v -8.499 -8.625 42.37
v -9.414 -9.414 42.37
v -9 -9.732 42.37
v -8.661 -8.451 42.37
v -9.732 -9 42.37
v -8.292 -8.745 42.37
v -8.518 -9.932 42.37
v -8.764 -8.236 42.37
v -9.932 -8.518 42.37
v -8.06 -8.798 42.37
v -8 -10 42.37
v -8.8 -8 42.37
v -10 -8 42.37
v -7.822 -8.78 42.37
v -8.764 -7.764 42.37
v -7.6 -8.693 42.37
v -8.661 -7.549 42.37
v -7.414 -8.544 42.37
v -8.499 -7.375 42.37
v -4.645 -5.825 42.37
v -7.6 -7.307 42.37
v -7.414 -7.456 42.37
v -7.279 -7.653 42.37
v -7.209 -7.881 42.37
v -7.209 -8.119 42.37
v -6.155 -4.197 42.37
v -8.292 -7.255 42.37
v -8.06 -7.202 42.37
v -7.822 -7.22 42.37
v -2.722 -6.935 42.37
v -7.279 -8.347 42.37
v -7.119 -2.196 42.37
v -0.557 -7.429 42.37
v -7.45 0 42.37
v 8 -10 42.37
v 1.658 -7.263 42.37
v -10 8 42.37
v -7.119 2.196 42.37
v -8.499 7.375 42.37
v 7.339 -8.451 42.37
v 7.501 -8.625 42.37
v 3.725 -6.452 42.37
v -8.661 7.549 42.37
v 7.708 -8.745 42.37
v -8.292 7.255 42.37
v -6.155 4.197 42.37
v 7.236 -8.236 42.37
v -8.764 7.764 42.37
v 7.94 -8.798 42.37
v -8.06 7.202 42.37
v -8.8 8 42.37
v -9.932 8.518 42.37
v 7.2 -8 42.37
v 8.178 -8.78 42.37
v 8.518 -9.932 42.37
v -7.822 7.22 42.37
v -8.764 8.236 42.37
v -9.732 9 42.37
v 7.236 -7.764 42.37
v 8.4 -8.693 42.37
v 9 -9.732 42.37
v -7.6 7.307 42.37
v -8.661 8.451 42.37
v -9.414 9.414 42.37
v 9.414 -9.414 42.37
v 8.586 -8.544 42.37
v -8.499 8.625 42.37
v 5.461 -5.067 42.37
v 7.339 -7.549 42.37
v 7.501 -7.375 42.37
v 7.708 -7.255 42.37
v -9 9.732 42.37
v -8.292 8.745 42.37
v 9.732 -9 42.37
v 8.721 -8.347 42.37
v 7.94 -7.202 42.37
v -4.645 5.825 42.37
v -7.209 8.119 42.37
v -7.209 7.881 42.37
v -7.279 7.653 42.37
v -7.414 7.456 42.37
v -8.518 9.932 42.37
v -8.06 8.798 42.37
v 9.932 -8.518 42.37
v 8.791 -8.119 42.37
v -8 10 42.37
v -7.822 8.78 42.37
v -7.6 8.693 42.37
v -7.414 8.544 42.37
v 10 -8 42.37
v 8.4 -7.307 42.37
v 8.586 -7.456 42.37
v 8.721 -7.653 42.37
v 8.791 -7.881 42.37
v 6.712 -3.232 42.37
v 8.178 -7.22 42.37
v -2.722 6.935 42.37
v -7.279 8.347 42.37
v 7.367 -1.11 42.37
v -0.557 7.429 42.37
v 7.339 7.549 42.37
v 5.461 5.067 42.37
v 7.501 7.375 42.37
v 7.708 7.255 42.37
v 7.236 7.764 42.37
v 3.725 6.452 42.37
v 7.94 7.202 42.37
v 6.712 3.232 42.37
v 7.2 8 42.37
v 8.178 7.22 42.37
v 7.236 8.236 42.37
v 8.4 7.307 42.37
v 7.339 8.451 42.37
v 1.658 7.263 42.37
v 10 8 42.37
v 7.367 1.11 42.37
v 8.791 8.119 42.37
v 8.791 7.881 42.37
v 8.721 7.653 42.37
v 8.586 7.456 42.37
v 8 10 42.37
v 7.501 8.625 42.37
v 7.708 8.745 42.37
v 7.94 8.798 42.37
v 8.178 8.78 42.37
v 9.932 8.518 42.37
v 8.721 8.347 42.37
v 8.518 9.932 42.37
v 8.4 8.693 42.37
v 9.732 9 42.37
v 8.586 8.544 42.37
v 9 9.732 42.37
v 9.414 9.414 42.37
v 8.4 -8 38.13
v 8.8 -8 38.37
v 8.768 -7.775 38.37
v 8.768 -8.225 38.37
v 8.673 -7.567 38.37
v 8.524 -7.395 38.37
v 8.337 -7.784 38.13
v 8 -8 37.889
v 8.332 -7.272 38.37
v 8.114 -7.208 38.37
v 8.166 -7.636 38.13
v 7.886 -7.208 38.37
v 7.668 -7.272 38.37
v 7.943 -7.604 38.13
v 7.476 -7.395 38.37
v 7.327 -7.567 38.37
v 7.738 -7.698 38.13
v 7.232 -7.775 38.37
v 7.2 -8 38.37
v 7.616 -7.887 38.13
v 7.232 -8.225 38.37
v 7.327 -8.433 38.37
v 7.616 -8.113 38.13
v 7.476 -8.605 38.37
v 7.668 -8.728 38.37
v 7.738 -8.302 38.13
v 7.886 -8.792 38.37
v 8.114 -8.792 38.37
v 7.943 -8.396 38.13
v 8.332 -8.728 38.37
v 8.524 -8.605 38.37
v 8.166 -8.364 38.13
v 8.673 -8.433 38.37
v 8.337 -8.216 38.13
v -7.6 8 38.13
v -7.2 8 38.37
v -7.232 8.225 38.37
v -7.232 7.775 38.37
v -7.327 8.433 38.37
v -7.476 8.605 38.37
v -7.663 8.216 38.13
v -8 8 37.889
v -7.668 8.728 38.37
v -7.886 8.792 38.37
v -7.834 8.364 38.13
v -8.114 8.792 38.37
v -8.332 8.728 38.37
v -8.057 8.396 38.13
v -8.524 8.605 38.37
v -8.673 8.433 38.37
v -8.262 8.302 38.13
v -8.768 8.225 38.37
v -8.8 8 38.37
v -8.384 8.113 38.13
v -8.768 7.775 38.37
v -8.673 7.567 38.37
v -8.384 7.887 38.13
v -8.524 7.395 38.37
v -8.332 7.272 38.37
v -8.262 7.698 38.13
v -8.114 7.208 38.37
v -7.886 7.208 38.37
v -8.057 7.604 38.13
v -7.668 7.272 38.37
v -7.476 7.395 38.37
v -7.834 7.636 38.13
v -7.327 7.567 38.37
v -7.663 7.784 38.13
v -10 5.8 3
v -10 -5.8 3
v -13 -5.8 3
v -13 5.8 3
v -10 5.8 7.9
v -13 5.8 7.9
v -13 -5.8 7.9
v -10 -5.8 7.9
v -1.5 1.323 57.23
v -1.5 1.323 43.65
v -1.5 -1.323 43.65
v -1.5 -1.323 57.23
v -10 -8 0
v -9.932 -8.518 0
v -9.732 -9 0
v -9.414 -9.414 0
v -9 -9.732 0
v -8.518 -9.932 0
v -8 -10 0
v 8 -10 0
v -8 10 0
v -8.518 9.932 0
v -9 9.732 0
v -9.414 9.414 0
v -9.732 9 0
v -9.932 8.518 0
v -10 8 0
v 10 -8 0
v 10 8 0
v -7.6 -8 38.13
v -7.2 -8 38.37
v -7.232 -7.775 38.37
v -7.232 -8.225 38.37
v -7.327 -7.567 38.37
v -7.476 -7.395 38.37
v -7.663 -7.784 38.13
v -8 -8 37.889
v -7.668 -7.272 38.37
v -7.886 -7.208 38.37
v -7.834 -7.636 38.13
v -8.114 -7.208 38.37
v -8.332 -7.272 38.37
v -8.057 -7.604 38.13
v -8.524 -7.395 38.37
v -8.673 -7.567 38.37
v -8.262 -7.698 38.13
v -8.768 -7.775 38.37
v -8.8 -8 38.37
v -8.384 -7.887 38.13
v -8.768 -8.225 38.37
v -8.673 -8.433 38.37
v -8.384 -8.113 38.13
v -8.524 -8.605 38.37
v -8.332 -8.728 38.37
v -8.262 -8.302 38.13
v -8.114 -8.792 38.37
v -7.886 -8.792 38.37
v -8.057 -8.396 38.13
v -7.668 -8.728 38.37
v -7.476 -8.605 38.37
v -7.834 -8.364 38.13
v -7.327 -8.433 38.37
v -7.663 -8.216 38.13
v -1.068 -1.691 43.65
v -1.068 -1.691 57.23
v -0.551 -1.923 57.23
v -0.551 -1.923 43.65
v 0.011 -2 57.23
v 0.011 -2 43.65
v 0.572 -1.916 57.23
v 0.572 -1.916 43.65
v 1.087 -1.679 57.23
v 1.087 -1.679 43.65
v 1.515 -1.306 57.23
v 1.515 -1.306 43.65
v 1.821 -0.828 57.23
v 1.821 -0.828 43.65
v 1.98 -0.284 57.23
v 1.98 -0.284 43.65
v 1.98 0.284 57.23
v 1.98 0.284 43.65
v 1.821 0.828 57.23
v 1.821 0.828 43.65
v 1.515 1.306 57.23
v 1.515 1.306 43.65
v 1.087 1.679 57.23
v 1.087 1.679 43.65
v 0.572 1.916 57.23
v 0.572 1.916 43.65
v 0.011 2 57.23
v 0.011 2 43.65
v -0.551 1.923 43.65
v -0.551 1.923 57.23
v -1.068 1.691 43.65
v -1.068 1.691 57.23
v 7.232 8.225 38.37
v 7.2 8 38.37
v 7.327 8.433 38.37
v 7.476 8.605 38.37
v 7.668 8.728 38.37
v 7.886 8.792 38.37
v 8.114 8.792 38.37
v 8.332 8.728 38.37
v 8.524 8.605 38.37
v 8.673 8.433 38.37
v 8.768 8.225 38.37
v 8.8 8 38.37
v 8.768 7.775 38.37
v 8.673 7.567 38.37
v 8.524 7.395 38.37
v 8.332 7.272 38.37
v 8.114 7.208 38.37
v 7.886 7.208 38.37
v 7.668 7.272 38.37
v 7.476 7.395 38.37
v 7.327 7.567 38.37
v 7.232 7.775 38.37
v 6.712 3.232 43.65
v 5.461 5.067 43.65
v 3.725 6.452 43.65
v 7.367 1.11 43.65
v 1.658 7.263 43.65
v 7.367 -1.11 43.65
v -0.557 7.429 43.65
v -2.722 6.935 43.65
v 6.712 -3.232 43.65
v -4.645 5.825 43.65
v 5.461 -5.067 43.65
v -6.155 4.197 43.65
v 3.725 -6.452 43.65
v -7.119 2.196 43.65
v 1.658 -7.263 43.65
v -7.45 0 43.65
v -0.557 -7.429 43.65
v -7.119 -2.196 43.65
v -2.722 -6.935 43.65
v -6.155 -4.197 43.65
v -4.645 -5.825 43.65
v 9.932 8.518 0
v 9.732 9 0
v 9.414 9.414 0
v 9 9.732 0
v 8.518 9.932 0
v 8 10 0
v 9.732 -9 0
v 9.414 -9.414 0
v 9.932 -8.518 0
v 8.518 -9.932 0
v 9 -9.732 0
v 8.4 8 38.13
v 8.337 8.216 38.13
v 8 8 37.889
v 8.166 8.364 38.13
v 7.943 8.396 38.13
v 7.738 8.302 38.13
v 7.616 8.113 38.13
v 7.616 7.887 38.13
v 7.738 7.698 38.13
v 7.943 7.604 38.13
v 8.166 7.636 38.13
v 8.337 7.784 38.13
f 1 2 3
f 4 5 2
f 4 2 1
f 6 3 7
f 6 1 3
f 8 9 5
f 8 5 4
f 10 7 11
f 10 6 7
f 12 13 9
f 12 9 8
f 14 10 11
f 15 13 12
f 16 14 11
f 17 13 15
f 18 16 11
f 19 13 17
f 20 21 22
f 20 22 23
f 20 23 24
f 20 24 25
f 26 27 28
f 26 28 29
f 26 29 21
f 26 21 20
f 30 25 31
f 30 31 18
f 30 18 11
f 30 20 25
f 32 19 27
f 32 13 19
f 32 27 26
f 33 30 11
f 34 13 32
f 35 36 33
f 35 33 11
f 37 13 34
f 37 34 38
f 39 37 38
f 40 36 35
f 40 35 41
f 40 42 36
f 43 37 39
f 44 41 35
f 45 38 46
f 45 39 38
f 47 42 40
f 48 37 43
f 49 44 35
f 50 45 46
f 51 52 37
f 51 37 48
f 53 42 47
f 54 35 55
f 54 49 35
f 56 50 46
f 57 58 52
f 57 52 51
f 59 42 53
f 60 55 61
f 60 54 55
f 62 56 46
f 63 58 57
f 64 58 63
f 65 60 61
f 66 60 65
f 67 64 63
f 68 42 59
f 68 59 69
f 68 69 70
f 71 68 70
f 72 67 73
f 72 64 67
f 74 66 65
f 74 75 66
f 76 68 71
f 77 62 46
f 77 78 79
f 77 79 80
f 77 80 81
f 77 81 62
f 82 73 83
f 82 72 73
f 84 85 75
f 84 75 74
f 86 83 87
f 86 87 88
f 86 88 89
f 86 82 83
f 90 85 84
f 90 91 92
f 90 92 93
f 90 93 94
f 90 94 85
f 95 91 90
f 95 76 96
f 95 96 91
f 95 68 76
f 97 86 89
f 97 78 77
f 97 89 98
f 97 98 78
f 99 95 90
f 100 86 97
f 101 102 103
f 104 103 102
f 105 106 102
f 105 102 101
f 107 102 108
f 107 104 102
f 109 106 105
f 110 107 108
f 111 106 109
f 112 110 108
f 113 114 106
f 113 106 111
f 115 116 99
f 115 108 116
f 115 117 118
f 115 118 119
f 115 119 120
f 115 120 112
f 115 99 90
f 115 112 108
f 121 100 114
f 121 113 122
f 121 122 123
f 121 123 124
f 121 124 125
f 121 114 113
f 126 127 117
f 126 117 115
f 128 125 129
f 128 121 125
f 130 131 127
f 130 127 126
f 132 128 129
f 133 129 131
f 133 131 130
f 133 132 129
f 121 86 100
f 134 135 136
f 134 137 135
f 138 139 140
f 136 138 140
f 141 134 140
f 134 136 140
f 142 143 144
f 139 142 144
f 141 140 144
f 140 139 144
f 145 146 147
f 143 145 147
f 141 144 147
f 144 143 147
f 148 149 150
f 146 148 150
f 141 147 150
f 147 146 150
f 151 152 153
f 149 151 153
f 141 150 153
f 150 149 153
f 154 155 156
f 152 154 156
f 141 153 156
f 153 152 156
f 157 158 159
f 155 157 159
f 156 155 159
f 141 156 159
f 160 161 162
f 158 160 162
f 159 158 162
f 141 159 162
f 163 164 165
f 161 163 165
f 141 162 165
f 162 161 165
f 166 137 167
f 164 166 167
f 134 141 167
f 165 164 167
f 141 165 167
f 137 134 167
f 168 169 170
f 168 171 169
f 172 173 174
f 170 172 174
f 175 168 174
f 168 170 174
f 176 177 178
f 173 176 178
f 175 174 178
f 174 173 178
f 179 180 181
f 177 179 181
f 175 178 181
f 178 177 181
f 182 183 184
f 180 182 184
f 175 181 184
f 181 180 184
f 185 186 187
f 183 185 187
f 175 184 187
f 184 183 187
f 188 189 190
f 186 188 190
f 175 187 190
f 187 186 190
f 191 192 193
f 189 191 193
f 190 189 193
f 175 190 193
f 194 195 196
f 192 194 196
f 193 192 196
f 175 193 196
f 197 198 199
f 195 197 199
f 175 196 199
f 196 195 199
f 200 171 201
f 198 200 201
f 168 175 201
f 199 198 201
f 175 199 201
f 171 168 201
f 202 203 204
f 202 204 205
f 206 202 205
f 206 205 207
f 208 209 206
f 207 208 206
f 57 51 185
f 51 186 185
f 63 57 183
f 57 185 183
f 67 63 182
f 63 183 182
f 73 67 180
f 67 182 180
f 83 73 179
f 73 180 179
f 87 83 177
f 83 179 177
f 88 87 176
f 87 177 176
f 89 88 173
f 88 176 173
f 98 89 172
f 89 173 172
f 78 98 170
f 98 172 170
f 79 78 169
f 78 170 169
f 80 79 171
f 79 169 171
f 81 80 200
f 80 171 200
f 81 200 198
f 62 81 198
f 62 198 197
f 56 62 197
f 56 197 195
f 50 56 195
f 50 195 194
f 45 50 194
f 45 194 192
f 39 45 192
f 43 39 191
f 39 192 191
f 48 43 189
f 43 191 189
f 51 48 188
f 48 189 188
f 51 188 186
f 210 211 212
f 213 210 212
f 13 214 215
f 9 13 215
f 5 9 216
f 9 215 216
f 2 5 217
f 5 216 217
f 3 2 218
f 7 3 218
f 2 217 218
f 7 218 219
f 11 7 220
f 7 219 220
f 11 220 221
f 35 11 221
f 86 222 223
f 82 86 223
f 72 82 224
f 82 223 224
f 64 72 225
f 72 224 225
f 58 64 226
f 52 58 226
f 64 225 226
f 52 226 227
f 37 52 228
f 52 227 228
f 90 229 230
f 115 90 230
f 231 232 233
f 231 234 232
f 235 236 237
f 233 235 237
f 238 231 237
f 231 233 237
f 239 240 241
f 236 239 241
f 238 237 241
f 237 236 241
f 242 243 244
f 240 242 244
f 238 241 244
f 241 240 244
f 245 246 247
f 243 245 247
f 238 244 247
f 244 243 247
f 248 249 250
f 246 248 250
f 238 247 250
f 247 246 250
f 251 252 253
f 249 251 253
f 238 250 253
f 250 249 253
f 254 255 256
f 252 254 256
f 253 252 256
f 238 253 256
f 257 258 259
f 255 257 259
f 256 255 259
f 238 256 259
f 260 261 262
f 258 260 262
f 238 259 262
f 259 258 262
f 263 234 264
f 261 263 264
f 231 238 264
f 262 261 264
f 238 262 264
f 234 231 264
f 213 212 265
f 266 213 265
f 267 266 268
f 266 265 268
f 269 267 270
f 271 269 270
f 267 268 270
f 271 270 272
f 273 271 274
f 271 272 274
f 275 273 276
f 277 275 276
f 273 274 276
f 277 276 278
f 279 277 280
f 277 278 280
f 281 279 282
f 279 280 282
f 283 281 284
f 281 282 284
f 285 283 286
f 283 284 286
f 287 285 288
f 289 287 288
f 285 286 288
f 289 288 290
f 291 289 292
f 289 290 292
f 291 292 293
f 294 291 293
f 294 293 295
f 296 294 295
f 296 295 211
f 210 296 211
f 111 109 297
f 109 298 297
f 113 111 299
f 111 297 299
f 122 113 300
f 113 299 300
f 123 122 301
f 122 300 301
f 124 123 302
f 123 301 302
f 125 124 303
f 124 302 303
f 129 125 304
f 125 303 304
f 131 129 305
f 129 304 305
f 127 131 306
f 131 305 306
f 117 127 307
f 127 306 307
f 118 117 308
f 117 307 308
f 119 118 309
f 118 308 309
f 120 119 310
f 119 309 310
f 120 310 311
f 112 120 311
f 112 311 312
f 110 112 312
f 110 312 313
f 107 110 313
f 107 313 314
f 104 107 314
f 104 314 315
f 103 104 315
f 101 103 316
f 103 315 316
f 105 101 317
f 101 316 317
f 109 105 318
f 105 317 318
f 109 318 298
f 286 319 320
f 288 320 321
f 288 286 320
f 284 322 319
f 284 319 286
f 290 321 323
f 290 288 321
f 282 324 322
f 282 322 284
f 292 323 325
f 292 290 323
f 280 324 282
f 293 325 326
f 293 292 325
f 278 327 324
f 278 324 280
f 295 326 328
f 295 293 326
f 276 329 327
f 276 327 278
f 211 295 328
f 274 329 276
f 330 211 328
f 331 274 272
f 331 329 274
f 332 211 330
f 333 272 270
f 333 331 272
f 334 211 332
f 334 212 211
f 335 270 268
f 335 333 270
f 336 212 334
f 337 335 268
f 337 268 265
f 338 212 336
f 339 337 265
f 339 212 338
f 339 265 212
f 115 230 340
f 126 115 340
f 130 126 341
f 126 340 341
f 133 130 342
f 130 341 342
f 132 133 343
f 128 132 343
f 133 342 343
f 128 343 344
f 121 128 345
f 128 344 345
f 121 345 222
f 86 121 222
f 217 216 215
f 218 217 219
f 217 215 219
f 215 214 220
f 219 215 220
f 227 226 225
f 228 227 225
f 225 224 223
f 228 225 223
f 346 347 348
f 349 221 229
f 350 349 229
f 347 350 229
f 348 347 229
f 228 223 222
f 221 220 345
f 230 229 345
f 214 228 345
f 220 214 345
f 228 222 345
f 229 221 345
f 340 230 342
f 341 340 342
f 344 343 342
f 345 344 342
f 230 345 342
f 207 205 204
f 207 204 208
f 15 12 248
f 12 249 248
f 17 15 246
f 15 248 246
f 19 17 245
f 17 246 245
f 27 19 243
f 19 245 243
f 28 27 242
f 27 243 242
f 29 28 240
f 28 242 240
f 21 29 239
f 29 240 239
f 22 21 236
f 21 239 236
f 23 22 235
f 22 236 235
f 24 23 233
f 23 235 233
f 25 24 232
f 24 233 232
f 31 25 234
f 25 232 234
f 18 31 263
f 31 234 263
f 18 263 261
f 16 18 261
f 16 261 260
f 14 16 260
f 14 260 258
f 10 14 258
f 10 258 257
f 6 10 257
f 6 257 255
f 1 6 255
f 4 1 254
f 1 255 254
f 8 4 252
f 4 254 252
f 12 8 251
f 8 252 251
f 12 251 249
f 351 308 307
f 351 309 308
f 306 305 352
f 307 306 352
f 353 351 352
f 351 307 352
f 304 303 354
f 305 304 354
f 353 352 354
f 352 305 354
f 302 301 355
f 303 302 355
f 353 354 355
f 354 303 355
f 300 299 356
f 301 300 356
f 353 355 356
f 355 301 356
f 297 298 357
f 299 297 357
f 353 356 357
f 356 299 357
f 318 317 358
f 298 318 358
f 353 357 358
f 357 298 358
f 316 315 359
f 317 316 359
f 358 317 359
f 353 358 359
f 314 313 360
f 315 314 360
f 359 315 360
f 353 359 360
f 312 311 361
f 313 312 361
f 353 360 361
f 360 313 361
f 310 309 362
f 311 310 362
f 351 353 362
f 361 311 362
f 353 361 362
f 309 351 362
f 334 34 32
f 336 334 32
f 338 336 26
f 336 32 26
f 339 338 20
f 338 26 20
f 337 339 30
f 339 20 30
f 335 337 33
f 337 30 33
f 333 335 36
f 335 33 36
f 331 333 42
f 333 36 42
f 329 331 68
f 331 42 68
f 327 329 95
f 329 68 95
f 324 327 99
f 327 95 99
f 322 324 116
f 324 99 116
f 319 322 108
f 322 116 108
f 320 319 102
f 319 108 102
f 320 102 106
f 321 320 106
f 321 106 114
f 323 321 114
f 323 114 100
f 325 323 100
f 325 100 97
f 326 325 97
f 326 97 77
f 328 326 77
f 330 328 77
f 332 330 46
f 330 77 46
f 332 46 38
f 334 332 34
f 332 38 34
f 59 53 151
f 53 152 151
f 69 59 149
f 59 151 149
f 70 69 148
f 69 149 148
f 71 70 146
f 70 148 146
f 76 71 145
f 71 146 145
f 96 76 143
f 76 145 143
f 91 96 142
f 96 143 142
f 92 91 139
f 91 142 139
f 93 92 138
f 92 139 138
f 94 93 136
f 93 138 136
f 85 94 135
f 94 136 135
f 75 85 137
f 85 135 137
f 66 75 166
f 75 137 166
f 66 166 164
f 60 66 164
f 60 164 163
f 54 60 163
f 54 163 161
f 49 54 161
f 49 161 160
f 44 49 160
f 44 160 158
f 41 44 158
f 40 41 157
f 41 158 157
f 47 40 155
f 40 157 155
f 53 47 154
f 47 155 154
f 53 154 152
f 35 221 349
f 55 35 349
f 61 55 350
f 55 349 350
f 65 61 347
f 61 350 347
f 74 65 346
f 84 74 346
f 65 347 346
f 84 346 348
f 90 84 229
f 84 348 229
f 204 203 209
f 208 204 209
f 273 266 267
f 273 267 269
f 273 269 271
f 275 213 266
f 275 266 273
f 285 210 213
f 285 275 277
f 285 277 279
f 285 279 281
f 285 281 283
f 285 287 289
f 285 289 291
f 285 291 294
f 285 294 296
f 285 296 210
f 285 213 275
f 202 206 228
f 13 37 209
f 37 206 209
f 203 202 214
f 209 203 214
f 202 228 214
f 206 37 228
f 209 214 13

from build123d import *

# Parameters (mm, degrees)
BOSS_EXTRUDE1_DEPTH   = 42.37
SKETCH2_R             = 7.45
BOSS_EXTRUDE2_DEPTH   = 1.28
BOSS_EXTRUDE3_DEPTH   = 13.58
SKETCH4_W             = 4.9
SKETCH4_H             = 11.6
BOSS_EXTRUDE4_DEPTH   = 3
M2_TAPPED_HOLE1_D     = 1.6
M2_TAPPED_HOLE1_DEPTH = 4
M2_TAPPED_HOLE1_TIP   = 0.480688495


with BuildPart() as part:
    # Sketch1 → Boss-Extrude1 (new body)
    with BuildSketch(Plane.XY):
        with BuildLine():
            Line((-8, -10), (8, -10))
            ThreePointArc((8, -10), (9.414213562, -9.414213562), (10, -8))
            Line((10, -8), (10, 8))
            ThreePointArc((10, 8), (9.414213562, 9.414213562), (8, 10))
            Line((8, 10), (-8, 10))
            ThreePointArc((-8, 10), (-9.414213562, 9.414213562), (-10, 8))
            Line((-10, 8), (-10, -8))
            ThreePointArc((-10, -8), (-9.414213562, -9.414213562), (-8, -10))
        make_face()
    extrude(amount=BOSS_EXTRUDE1_DEPTH)

    # Sketch2 → Boss-Extrude2 (add)
    with BuildSketch(Plane.XY.offset(42.37)):
        with Locations(Location((0, 0, 0), (0, 0, 180))):
            Circle(SKETCH2_R)
    extrude(amount=BOSS_EXTRUDE2_DEPTH)

    # Sketch3 → Boss-Extrude3 (add)
    with BuildSketch(Plane.XY.offset(43.65)):
        with BuildLine():
            Line((-1.5, 1.322875656), (-1.5, -1.322875656))
            ThreePointArc((-1.5, -1.322875656), (2, 0), (-1.5, 1.322875656))
        make_face()
    extrude(amount=BOSS_EXTRUDE3_DEPTH)

    # Sketch4 → Boss-Extrude4 (add)
    with BuildSketch(Plane.ZY.offset(10)):
        with Locations((5.45, 0)):
            Rectangle(SKETCH4_W, SKETCH4_H)
    extrude(amount=BOSS_EXTRUDE4_DEPTH)

    # M2 Tapped Hole1
    with Locations(Plane.XY.offset(42.37)):
        with Locations((-8, -8), (8, -8), (8, 8), (-8, 8)):
            Hole(M2_TAPPED_HOLE1_D / 2, depth=M2_TAPPED_HOLE1_DEPTH)
            with Locations((0, 0, -(M2_TAPPED_HOLE1_DEPTH + M2_TAPPED_HOLE1_TIP / 2))):  # 118° drill point
                Cone(0, M2_TAPPED_HOLE1_D / 2, M2_TAPPED_HOLE1_TIP, mode=Mode.SUBTRACT)


solid = part.part
